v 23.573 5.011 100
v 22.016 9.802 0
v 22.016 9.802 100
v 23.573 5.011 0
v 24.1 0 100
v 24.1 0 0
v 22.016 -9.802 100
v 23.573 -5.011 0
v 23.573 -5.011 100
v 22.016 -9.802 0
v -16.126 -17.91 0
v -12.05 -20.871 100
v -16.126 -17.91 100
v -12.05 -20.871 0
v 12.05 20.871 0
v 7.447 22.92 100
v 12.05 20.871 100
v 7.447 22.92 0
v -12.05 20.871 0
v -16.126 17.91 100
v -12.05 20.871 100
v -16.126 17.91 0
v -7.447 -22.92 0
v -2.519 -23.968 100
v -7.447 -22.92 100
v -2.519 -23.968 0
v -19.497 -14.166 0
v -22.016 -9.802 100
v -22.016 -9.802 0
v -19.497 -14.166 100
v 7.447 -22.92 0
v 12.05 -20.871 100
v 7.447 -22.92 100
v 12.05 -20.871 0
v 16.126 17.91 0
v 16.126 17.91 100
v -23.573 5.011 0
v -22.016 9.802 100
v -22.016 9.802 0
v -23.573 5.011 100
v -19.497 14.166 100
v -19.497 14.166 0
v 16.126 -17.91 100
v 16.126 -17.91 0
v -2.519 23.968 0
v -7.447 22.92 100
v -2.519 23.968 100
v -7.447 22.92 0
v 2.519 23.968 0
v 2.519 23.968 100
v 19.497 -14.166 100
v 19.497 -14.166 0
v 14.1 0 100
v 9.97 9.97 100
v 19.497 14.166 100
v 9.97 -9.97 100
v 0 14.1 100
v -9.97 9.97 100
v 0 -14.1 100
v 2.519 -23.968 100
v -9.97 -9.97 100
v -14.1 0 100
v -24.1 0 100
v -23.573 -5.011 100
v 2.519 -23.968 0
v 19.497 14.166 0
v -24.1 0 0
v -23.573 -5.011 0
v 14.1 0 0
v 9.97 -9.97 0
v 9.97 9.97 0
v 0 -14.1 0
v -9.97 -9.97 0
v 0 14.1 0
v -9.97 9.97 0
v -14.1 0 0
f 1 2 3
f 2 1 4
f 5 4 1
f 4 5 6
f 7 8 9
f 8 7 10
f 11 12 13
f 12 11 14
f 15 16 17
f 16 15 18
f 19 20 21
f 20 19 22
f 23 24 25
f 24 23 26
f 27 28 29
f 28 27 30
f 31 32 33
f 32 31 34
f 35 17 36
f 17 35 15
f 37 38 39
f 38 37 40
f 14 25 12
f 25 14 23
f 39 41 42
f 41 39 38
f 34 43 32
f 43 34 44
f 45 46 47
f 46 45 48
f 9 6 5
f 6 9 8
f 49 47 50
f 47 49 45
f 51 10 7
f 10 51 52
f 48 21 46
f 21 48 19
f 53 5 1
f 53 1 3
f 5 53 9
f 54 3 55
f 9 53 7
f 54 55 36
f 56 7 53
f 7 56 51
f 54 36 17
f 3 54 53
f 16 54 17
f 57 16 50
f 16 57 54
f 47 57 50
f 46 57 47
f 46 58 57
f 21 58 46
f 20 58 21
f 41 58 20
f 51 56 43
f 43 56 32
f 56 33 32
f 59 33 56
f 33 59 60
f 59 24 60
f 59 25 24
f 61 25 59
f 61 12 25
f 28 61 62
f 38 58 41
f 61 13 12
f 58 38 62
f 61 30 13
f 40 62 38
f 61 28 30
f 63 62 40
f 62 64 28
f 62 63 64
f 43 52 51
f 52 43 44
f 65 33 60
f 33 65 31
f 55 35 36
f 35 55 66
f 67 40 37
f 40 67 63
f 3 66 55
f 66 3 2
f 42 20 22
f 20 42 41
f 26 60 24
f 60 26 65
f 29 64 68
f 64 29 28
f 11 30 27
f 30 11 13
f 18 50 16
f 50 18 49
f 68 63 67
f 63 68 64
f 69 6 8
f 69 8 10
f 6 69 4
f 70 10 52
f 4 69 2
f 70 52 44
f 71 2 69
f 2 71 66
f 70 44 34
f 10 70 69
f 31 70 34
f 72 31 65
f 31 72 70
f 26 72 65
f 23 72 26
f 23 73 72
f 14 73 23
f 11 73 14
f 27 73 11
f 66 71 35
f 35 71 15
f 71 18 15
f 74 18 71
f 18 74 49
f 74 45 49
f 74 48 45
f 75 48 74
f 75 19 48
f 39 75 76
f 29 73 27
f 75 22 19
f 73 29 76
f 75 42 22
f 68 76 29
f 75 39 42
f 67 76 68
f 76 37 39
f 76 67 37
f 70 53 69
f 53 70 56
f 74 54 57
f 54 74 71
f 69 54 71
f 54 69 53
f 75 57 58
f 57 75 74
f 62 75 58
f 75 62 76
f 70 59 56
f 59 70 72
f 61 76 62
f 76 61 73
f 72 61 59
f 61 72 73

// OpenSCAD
pipe(od=48.2,t=10,l=100,prep="n",spigot=0);
module pipe(od=219.1,t=10.7,l=100,prep="n",spigot=0){
    //prep 0=none, t=top, b= bottom, a= both (all)
    id=od-2*t;
    difference(){
        if (prep=="t"){
            cylinder(d=od,h=l-t);    //prep on top
            translate([0,0,l-t]) weldPrep(od=od,t=t);
        }
        else if (prep=="b"){ 
            translate([0,0,t]) cylinder(d=od,h=l-t);    //prep on bottom
            translate([0,0,t]) rotate([180,0,0]) weldPrep(od=od,t=t);
        }
        else if (prep=="a"){ 
            translate([0,0,t]) cylinder(d=od,h=l-2*t);  //prep on both ends  
            translate([0,0,l-t]) weldPrep(od=od,t=t);
            translate([0,0,t]) rotate([180,0,0]) weldPrep(od=od,t=t);
        }
        else if (prep=="n"){
            cylinder(d=od,h=l); 
        }       
        translate([0,0,-1]) cylinder(d=id,h=l+2*t+2,$fn=8);   //bore
        if(spigot>0)    //create socket in 2nd end
            translate([0,0,l])
            cylinder(h=20,d=od-2*t,$fn=8,center=true);
    }
    if(spigot>0)//place spigot on 1st end
       translate([0,0,l])cylinder(h=20,d=od-2*0.98*t,$fn=8,center=true);
    if(spigot>1)    //create spigot in 2nd end
        cylinder(h=20,d=0.98*od-2*t,$fn=8,center=true);
}
